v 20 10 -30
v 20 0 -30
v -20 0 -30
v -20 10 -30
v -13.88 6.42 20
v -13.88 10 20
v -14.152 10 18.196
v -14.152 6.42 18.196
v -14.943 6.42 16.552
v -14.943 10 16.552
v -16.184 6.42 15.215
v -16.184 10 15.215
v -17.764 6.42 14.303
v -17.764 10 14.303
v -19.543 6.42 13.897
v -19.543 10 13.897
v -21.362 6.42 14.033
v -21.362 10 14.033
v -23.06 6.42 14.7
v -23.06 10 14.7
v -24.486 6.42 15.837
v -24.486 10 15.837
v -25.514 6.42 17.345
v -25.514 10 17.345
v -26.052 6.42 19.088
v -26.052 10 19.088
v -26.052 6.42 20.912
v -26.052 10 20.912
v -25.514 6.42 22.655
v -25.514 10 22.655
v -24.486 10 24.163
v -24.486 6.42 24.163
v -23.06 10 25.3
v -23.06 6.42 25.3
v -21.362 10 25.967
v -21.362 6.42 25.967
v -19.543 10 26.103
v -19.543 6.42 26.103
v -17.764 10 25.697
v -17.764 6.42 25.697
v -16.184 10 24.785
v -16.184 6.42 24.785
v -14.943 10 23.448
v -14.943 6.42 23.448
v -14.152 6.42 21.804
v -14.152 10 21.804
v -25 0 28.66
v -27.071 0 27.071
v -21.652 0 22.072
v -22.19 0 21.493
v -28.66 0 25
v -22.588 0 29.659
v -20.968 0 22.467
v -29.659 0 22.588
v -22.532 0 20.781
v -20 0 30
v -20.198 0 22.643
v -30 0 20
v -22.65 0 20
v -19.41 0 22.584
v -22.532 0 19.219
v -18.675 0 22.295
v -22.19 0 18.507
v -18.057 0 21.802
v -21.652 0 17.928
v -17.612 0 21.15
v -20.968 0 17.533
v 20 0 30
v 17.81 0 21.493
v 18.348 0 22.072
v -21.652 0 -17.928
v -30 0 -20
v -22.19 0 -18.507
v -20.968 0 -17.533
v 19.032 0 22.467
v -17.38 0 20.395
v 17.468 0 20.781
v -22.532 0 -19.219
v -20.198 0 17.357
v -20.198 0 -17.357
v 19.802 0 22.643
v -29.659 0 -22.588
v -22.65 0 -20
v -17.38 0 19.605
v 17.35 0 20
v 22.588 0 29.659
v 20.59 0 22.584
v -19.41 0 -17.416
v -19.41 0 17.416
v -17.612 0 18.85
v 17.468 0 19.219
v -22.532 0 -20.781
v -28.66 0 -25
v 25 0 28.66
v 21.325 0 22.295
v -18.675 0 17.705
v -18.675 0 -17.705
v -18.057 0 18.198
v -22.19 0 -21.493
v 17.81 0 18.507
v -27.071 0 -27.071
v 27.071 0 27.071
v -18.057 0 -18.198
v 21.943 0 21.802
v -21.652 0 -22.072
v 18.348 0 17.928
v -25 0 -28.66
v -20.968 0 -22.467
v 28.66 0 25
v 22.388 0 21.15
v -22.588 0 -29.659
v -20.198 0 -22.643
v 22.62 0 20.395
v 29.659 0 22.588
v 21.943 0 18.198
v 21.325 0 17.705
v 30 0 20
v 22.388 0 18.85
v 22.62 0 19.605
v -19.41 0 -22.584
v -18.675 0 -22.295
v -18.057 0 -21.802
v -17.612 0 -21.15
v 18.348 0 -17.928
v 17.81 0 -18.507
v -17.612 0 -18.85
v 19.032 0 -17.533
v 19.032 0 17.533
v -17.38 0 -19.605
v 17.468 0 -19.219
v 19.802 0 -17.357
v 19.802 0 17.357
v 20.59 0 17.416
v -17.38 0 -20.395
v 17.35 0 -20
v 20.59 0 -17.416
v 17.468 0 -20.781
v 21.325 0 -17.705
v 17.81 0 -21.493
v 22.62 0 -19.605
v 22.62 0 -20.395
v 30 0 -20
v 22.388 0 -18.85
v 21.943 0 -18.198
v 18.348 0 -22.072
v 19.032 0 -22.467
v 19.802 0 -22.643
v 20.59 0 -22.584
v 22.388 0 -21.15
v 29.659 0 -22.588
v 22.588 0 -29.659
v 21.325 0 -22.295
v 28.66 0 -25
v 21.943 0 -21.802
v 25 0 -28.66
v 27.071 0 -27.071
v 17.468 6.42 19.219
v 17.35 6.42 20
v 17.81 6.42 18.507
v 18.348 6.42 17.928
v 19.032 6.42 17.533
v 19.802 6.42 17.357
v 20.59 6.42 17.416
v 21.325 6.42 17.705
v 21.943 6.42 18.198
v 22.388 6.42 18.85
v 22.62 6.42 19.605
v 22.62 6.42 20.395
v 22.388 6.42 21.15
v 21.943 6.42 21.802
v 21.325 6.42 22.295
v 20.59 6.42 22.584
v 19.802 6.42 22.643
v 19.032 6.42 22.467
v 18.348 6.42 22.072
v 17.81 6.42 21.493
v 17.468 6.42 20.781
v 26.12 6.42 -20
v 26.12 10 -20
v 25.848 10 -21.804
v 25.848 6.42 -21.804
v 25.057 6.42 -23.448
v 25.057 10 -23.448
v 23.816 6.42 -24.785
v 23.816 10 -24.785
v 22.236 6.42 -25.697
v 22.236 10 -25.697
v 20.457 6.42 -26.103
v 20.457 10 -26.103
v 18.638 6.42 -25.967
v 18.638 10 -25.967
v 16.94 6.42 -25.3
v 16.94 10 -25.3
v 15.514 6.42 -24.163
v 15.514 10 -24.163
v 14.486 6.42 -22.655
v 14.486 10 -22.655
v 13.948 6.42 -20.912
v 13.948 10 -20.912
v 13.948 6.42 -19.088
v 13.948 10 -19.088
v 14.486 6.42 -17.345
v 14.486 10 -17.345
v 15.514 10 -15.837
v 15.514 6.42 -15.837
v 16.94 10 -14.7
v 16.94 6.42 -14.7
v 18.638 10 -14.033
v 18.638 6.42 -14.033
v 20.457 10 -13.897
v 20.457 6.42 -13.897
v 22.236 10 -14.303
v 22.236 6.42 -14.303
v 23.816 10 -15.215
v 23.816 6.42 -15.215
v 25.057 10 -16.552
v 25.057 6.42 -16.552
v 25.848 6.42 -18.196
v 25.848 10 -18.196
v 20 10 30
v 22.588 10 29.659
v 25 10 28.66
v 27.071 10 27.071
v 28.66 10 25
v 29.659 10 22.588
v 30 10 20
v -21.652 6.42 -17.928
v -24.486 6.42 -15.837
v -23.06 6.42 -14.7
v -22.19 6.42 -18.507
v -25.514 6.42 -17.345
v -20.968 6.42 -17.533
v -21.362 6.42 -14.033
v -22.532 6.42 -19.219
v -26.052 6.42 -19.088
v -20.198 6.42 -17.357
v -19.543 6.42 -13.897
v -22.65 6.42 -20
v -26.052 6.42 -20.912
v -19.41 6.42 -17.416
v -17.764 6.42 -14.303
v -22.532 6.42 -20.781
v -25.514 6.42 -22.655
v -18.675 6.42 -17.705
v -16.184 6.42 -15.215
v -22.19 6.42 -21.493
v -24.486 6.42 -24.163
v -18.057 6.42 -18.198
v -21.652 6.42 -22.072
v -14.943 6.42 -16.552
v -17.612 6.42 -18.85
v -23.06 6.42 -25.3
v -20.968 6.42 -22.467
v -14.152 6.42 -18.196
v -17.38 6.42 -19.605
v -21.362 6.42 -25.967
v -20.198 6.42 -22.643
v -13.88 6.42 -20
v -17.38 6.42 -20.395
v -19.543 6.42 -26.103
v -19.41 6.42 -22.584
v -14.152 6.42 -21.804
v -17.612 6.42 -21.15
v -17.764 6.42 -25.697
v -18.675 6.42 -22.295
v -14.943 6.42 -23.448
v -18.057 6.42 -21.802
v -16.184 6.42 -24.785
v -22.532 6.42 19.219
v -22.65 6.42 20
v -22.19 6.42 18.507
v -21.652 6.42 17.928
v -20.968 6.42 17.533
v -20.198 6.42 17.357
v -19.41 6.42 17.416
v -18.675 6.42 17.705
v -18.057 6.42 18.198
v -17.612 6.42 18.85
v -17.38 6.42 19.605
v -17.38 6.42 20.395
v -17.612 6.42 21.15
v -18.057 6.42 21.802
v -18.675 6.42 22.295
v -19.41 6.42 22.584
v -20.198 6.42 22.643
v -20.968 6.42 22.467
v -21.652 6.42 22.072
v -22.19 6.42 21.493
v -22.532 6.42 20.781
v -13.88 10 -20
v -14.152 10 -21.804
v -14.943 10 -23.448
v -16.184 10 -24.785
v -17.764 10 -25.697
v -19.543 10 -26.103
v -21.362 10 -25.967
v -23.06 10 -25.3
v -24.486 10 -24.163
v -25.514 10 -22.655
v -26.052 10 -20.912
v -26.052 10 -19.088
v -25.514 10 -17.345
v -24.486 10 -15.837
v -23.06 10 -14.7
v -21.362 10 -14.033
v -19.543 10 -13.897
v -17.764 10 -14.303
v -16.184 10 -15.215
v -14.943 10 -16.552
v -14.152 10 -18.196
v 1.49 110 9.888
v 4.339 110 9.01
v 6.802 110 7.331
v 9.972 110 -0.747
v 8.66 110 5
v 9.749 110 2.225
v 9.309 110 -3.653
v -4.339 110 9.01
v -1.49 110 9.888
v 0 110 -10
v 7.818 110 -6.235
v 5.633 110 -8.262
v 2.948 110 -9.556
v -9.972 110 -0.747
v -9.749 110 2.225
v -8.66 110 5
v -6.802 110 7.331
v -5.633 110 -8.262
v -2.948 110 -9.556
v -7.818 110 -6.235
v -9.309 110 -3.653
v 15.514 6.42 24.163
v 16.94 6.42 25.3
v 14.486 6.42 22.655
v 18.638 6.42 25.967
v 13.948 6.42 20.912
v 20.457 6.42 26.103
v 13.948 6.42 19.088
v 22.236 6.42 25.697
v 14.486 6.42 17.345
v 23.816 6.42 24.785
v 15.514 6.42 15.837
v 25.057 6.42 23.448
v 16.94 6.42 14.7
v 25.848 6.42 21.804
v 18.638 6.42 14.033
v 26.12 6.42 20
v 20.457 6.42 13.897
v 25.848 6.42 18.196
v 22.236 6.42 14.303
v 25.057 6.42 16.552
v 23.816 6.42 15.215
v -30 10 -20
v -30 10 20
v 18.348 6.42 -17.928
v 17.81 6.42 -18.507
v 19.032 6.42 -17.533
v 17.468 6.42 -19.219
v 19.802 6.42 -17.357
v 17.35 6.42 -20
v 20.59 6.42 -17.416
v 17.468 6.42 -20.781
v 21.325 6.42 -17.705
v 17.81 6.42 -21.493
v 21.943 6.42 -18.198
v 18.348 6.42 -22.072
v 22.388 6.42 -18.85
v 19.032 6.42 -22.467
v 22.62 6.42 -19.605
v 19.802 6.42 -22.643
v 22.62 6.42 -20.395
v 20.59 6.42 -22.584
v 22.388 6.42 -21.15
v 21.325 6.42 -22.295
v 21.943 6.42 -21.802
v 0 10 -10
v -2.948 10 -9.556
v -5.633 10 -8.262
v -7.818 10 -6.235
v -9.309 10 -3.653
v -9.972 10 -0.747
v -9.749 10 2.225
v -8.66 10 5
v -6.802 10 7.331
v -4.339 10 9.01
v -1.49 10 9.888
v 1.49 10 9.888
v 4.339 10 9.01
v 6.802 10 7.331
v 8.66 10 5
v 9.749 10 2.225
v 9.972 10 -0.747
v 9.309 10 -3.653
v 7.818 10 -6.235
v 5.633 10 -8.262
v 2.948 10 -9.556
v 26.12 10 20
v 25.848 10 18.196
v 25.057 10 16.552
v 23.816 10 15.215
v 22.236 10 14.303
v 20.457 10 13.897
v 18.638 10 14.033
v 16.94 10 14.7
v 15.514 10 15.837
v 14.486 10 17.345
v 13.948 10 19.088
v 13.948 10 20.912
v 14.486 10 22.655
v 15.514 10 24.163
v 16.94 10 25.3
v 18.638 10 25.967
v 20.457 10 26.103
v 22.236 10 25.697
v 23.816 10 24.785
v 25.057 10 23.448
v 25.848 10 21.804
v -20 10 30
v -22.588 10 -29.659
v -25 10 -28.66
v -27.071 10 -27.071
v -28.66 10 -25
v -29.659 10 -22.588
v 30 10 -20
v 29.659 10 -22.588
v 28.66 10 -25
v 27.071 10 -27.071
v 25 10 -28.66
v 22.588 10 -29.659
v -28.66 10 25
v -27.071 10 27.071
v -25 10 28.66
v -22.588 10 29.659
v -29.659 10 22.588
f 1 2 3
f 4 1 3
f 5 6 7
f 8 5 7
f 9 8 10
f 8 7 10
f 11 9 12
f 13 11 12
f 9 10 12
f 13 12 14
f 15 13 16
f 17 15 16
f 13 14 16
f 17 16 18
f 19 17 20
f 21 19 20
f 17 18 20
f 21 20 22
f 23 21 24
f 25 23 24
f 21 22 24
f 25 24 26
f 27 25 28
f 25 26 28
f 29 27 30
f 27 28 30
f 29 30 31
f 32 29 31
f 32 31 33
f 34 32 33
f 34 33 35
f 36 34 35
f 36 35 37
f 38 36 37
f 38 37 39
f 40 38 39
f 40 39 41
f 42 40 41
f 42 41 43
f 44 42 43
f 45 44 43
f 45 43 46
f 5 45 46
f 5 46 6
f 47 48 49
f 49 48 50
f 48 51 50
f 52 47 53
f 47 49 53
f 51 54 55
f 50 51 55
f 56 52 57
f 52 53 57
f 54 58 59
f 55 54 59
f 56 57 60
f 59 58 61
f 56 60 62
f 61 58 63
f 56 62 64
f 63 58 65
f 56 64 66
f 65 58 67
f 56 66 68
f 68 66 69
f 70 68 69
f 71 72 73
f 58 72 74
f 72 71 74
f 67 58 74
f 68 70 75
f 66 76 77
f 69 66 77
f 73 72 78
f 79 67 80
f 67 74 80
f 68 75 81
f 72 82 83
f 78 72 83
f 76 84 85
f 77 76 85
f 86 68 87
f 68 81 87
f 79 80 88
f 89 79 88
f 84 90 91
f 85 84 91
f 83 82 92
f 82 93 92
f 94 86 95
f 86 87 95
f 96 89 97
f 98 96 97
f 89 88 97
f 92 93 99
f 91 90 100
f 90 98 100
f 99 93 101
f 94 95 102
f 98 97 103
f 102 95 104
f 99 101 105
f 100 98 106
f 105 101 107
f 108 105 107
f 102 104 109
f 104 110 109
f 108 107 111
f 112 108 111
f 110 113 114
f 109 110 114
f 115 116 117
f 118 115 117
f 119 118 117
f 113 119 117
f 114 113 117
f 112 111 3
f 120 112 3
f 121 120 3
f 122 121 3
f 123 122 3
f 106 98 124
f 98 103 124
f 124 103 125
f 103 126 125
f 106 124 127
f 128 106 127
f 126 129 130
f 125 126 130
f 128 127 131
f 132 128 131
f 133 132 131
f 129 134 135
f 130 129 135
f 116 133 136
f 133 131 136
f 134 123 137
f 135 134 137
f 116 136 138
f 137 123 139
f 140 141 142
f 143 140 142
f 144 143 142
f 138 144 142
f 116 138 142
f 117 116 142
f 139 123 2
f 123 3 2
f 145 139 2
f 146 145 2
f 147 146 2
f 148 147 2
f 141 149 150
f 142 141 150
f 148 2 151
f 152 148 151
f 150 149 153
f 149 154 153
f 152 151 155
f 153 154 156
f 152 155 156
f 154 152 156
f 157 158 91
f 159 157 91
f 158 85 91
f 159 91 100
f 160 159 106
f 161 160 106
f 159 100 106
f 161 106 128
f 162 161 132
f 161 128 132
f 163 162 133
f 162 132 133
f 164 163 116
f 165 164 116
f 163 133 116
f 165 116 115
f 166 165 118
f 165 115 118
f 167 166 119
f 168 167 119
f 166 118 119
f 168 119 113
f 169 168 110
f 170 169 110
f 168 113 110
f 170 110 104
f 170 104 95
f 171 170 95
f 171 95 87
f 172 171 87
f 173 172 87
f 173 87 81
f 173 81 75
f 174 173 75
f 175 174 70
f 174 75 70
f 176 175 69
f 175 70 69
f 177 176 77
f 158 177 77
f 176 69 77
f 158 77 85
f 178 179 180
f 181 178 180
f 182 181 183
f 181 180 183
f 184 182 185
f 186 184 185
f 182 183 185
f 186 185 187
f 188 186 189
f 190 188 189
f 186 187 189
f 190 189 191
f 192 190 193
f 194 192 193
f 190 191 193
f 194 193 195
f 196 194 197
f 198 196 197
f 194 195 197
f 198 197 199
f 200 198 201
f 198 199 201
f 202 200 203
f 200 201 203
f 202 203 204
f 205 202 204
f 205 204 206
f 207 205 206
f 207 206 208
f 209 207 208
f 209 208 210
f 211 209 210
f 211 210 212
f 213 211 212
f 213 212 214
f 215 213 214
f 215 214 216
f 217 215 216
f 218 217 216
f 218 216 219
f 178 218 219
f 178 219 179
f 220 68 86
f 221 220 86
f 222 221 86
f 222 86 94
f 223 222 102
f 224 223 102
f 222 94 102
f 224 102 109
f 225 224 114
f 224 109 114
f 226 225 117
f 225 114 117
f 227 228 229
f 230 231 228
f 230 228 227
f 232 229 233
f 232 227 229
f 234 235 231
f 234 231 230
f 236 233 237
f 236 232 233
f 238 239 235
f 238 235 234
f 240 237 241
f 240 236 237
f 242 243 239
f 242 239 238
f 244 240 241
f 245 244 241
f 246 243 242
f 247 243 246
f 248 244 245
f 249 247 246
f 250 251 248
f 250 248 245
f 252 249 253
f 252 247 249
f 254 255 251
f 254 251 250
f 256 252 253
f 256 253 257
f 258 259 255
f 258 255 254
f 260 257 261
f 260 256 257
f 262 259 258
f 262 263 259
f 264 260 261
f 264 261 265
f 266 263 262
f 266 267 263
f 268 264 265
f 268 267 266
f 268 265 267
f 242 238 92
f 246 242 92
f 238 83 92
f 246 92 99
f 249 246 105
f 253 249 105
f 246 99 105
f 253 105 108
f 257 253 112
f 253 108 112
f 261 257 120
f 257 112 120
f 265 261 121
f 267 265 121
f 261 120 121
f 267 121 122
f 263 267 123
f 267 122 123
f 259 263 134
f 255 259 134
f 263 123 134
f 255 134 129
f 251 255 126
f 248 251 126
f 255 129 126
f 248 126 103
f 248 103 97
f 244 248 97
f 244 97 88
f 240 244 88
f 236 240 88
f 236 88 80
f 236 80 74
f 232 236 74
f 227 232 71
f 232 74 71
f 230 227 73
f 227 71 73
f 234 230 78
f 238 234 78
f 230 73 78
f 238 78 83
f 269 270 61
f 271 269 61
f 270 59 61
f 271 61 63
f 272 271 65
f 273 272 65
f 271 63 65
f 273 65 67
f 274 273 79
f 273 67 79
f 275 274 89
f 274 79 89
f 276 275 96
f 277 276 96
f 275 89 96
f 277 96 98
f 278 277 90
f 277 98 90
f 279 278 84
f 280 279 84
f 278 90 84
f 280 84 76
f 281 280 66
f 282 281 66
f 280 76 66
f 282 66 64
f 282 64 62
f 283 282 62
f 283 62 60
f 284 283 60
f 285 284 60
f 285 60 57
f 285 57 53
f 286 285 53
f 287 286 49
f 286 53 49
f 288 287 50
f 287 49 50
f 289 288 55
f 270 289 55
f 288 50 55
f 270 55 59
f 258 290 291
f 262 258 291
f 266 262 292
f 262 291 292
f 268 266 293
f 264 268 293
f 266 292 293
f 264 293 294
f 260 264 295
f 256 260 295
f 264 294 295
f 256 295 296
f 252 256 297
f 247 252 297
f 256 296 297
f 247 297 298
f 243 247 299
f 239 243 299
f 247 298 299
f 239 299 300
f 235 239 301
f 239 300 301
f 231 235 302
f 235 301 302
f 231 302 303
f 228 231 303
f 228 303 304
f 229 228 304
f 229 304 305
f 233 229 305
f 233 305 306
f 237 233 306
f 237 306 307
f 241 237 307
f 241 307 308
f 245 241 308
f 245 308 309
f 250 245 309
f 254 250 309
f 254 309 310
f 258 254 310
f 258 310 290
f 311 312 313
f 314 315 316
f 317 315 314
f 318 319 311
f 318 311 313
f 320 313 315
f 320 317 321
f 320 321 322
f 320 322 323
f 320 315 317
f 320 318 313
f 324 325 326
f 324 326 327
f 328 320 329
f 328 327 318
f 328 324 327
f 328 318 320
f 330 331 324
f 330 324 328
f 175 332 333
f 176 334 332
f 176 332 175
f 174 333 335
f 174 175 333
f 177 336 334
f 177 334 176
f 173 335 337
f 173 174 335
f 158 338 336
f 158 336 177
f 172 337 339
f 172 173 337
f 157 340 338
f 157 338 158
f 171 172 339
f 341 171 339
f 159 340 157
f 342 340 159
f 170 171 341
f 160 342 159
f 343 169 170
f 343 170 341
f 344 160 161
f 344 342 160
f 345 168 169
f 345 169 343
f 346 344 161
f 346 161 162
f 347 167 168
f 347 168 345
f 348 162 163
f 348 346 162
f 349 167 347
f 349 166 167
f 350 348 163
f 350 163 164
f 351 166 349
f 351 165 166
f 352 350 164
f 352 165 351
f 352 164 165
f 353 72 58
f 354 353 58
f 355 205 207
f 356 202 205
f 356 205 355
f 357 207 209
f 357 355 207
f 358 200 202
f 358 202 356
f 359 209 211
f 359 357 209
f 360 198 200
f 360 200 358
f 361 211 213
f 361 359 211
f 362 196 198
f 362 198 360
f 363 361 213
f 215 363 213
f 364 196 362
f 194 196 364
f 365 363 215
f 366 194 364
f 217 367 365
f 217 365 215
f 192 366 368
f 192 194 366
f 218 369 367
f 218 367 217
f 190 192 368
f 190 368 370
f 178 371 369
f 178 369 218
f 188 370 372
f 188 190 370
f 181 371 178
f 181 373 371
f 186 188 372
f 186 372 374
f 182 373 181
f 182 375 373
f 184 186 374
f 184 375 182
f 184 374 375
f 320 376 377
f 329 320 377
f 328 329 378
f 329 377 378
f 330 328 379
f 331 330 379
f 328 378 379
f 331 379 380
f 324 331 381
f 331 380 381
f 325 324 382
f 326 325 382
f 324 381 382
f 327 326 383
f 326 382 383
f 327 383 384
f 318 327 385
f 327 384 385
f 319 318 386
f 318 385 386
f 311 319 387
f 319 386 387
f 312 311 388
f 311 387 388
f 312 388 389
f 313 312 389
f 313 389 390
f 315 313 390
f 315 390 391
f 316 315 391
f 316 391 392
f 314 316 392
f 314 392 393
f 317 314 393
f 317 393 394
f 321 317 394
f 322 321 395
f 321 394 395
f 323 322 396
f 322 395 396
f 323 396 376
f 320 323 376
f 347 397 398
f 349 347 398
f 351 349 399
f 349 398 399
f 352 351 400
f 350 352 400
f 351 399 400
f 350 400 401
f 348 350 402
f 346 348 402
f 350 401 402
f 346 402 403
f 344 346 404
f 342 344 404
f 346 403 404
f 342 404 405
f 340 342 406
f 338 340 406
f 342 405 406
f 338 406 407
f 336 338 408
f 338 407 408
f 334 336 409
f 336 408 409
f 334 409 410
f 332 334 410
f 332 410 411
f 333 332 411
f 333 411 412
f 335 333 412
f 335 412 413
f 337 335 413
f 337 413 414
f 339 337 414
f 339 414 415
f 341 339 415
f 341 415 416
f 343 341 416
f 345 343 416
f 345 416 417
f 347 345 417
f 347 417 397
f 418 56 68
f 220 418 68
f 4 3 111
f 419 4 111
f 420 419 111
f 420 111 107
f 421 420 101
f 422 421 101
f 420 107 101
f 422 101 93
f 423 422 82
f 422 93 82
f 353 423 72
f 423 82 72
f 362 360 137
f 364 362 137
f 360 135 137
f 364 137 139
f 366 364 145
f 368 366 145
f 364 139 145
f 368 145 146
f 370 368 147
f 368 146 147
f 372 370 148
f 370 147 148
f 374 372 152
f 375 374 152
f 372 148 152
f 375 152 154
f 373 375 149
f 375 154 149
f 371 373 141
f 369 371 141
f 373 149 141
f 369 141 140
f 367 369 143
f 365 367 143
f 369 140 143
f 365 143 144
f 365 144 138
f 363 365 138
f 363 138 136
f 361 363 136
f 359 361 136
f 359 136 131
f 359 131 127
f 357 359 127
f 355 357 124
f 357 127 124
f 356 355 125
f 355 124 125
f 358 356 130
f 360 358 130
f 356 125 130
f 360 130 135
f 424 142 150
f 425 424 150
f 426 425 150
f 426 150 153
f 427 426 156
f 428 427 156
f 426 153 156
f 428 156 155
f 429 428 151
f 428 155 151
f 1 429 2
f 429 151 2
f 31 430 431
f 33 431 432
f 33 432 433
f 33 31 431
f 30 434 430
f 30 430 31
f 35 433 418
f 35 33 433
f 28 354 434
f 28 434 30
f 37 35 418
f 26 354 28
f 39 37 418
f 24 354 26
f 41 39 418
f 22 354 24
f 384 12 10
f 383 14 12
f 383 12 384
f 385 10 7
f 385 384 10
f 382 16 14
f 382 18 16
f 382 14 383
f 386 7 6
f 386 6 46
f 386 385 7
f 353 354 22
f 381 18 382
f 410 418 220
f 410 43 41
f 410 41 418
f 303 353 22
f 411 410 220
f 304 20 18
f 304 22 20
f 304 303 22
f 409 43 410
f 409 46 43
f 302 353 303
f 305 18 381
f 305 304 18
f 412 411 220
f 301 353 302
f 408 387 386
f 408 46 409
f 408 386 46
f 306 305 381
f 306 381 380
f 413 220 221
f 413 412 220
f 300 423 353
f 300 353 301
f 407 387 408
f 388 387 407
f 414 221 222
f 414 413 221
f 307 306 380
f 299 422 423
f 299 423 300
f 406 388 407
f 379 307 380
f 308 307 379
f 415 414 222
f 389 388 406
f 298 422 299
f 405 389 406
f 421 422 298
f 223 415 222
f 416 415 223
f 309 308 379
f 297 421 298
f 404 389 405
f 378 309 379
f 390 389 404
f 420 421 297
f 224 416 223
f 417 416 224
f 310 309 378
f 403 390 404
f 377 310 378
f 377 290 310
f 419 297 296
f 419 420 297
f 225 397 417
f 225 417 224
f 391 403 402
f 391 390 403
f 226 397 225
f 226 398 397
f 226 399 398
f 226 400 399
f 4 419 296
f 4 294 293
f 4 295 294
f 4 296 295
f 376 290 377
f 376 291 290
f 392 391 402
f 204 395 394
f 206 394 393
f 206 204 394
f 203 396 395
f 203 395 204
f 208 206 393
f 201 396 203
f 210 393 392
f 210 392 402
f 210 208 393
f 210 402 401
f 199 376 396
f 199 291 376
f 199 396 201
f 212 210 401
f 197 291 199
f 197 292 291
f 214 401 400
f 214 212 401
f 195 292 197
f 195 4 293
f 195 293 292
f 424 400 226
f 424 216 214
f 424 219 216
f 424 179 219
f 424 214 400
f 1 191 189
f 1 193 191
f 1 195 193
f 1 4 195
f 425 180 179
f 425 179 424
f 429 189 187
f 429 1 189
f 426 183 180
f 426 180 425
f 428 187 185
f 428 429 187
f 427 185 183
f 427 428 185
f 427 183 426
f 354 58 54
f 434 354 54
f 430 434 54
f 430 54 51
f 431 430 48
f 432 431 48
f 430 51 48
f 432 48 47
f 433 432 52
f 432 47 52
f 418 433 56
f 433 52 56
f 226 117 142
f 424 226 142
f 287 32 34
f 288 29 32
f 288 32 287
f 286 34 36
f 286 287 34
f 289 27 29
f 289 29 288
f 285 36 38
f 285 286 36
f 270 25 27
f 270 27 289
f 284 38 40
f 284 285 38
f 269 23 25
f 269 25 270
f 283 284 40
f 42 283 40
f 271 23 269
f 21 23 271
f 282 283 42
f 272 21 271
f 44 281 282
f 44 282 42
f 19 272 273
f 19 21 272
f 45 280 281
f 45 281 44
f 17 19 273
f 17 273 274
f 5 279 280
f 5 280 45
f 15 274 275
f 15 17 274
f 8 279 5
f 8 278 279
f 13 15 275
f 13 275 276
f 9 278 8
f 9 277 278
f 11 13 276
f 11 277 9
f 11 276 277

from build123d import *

# Parameters (mm, degrees)
BOSS_EXTRUDE1_DEPTH                     = 10
CBORE_FOR_M5_HEX_HEAD_BOLT1_D           = 5.3
CBORE_FOR_M5_HEX_HEAD_BOLT1_CBORE_D     = 12.24
CBORE_FOR_M5_HEX_HEAD_BOLT1_CBORE_DEPTH = 3.58
SKETCH7_R                               = 10
BOSS_EXTRUDE2_DEPTH                     = 100


with BuildPart() as part:
    # Sketch1 → Boss-Extrude1 (new body)
    with BuildSketch(Plane(origin=(0, 0, 0), x_dir=(1, 0, 0), z_dir=(0, 1, 0))):
        with BuildLine():
            Line((-20, -30), (20, -30))
            ThreePointArc((20, -30), (27.071067812, -27.071067812), (30, -20))
            Line((30, -20), (30, 20))
            ThreePointArc((30, 20), (27.071067812, 27.071067812), (20, 30))
            Line((20, 30), (-20, 30))
            ThreePointArc((-20, 30), (-27.071067812, 27.071067812), (-30, 20))
            Line((-30, 20), (-30, -20))
            ThreePointArc((-30, -20), (-27.071067812, -27.071067812), (-20, -30))
        make_face()
    extrude(amount=BOSS_EXTRUDE1_DEPTH)

    # CBORE for M5 Hex Head Bolt1 (through all)
    with Locations(Plane(origin=(0, 10, 0), x_dir=(1, 0, 0), z_dir=(0, 1, 0))):
        with Locations((-20, -20), (-20, 20), (20, 20), (20, -20)):
            CounterBoreHole(CBORE_FOR_M5_HEX_HEAD_BOLT1_D / 2, CBORE_FOR_M5_HEX_HEAD_BOLT1_CBORE_D / 2, CBORE_FOR_M5_HEX_HEAD_BOLT1_CBORE_DEPTH)

    # Sketch7 → Boss-Extrude2 (add)
    with BuildSketch(Plane(origin=(0, 10, 0), x_dir=(1, 0, 0), z_dir=(0, 1, 0))):
        with Locations(Location((0, 0, 0), (0, 0, 90))):
            Circle(SKETCH7_R)
    extrude(amount=BOSS_EXTRUDE2_DEPTH)


solid = part.part
